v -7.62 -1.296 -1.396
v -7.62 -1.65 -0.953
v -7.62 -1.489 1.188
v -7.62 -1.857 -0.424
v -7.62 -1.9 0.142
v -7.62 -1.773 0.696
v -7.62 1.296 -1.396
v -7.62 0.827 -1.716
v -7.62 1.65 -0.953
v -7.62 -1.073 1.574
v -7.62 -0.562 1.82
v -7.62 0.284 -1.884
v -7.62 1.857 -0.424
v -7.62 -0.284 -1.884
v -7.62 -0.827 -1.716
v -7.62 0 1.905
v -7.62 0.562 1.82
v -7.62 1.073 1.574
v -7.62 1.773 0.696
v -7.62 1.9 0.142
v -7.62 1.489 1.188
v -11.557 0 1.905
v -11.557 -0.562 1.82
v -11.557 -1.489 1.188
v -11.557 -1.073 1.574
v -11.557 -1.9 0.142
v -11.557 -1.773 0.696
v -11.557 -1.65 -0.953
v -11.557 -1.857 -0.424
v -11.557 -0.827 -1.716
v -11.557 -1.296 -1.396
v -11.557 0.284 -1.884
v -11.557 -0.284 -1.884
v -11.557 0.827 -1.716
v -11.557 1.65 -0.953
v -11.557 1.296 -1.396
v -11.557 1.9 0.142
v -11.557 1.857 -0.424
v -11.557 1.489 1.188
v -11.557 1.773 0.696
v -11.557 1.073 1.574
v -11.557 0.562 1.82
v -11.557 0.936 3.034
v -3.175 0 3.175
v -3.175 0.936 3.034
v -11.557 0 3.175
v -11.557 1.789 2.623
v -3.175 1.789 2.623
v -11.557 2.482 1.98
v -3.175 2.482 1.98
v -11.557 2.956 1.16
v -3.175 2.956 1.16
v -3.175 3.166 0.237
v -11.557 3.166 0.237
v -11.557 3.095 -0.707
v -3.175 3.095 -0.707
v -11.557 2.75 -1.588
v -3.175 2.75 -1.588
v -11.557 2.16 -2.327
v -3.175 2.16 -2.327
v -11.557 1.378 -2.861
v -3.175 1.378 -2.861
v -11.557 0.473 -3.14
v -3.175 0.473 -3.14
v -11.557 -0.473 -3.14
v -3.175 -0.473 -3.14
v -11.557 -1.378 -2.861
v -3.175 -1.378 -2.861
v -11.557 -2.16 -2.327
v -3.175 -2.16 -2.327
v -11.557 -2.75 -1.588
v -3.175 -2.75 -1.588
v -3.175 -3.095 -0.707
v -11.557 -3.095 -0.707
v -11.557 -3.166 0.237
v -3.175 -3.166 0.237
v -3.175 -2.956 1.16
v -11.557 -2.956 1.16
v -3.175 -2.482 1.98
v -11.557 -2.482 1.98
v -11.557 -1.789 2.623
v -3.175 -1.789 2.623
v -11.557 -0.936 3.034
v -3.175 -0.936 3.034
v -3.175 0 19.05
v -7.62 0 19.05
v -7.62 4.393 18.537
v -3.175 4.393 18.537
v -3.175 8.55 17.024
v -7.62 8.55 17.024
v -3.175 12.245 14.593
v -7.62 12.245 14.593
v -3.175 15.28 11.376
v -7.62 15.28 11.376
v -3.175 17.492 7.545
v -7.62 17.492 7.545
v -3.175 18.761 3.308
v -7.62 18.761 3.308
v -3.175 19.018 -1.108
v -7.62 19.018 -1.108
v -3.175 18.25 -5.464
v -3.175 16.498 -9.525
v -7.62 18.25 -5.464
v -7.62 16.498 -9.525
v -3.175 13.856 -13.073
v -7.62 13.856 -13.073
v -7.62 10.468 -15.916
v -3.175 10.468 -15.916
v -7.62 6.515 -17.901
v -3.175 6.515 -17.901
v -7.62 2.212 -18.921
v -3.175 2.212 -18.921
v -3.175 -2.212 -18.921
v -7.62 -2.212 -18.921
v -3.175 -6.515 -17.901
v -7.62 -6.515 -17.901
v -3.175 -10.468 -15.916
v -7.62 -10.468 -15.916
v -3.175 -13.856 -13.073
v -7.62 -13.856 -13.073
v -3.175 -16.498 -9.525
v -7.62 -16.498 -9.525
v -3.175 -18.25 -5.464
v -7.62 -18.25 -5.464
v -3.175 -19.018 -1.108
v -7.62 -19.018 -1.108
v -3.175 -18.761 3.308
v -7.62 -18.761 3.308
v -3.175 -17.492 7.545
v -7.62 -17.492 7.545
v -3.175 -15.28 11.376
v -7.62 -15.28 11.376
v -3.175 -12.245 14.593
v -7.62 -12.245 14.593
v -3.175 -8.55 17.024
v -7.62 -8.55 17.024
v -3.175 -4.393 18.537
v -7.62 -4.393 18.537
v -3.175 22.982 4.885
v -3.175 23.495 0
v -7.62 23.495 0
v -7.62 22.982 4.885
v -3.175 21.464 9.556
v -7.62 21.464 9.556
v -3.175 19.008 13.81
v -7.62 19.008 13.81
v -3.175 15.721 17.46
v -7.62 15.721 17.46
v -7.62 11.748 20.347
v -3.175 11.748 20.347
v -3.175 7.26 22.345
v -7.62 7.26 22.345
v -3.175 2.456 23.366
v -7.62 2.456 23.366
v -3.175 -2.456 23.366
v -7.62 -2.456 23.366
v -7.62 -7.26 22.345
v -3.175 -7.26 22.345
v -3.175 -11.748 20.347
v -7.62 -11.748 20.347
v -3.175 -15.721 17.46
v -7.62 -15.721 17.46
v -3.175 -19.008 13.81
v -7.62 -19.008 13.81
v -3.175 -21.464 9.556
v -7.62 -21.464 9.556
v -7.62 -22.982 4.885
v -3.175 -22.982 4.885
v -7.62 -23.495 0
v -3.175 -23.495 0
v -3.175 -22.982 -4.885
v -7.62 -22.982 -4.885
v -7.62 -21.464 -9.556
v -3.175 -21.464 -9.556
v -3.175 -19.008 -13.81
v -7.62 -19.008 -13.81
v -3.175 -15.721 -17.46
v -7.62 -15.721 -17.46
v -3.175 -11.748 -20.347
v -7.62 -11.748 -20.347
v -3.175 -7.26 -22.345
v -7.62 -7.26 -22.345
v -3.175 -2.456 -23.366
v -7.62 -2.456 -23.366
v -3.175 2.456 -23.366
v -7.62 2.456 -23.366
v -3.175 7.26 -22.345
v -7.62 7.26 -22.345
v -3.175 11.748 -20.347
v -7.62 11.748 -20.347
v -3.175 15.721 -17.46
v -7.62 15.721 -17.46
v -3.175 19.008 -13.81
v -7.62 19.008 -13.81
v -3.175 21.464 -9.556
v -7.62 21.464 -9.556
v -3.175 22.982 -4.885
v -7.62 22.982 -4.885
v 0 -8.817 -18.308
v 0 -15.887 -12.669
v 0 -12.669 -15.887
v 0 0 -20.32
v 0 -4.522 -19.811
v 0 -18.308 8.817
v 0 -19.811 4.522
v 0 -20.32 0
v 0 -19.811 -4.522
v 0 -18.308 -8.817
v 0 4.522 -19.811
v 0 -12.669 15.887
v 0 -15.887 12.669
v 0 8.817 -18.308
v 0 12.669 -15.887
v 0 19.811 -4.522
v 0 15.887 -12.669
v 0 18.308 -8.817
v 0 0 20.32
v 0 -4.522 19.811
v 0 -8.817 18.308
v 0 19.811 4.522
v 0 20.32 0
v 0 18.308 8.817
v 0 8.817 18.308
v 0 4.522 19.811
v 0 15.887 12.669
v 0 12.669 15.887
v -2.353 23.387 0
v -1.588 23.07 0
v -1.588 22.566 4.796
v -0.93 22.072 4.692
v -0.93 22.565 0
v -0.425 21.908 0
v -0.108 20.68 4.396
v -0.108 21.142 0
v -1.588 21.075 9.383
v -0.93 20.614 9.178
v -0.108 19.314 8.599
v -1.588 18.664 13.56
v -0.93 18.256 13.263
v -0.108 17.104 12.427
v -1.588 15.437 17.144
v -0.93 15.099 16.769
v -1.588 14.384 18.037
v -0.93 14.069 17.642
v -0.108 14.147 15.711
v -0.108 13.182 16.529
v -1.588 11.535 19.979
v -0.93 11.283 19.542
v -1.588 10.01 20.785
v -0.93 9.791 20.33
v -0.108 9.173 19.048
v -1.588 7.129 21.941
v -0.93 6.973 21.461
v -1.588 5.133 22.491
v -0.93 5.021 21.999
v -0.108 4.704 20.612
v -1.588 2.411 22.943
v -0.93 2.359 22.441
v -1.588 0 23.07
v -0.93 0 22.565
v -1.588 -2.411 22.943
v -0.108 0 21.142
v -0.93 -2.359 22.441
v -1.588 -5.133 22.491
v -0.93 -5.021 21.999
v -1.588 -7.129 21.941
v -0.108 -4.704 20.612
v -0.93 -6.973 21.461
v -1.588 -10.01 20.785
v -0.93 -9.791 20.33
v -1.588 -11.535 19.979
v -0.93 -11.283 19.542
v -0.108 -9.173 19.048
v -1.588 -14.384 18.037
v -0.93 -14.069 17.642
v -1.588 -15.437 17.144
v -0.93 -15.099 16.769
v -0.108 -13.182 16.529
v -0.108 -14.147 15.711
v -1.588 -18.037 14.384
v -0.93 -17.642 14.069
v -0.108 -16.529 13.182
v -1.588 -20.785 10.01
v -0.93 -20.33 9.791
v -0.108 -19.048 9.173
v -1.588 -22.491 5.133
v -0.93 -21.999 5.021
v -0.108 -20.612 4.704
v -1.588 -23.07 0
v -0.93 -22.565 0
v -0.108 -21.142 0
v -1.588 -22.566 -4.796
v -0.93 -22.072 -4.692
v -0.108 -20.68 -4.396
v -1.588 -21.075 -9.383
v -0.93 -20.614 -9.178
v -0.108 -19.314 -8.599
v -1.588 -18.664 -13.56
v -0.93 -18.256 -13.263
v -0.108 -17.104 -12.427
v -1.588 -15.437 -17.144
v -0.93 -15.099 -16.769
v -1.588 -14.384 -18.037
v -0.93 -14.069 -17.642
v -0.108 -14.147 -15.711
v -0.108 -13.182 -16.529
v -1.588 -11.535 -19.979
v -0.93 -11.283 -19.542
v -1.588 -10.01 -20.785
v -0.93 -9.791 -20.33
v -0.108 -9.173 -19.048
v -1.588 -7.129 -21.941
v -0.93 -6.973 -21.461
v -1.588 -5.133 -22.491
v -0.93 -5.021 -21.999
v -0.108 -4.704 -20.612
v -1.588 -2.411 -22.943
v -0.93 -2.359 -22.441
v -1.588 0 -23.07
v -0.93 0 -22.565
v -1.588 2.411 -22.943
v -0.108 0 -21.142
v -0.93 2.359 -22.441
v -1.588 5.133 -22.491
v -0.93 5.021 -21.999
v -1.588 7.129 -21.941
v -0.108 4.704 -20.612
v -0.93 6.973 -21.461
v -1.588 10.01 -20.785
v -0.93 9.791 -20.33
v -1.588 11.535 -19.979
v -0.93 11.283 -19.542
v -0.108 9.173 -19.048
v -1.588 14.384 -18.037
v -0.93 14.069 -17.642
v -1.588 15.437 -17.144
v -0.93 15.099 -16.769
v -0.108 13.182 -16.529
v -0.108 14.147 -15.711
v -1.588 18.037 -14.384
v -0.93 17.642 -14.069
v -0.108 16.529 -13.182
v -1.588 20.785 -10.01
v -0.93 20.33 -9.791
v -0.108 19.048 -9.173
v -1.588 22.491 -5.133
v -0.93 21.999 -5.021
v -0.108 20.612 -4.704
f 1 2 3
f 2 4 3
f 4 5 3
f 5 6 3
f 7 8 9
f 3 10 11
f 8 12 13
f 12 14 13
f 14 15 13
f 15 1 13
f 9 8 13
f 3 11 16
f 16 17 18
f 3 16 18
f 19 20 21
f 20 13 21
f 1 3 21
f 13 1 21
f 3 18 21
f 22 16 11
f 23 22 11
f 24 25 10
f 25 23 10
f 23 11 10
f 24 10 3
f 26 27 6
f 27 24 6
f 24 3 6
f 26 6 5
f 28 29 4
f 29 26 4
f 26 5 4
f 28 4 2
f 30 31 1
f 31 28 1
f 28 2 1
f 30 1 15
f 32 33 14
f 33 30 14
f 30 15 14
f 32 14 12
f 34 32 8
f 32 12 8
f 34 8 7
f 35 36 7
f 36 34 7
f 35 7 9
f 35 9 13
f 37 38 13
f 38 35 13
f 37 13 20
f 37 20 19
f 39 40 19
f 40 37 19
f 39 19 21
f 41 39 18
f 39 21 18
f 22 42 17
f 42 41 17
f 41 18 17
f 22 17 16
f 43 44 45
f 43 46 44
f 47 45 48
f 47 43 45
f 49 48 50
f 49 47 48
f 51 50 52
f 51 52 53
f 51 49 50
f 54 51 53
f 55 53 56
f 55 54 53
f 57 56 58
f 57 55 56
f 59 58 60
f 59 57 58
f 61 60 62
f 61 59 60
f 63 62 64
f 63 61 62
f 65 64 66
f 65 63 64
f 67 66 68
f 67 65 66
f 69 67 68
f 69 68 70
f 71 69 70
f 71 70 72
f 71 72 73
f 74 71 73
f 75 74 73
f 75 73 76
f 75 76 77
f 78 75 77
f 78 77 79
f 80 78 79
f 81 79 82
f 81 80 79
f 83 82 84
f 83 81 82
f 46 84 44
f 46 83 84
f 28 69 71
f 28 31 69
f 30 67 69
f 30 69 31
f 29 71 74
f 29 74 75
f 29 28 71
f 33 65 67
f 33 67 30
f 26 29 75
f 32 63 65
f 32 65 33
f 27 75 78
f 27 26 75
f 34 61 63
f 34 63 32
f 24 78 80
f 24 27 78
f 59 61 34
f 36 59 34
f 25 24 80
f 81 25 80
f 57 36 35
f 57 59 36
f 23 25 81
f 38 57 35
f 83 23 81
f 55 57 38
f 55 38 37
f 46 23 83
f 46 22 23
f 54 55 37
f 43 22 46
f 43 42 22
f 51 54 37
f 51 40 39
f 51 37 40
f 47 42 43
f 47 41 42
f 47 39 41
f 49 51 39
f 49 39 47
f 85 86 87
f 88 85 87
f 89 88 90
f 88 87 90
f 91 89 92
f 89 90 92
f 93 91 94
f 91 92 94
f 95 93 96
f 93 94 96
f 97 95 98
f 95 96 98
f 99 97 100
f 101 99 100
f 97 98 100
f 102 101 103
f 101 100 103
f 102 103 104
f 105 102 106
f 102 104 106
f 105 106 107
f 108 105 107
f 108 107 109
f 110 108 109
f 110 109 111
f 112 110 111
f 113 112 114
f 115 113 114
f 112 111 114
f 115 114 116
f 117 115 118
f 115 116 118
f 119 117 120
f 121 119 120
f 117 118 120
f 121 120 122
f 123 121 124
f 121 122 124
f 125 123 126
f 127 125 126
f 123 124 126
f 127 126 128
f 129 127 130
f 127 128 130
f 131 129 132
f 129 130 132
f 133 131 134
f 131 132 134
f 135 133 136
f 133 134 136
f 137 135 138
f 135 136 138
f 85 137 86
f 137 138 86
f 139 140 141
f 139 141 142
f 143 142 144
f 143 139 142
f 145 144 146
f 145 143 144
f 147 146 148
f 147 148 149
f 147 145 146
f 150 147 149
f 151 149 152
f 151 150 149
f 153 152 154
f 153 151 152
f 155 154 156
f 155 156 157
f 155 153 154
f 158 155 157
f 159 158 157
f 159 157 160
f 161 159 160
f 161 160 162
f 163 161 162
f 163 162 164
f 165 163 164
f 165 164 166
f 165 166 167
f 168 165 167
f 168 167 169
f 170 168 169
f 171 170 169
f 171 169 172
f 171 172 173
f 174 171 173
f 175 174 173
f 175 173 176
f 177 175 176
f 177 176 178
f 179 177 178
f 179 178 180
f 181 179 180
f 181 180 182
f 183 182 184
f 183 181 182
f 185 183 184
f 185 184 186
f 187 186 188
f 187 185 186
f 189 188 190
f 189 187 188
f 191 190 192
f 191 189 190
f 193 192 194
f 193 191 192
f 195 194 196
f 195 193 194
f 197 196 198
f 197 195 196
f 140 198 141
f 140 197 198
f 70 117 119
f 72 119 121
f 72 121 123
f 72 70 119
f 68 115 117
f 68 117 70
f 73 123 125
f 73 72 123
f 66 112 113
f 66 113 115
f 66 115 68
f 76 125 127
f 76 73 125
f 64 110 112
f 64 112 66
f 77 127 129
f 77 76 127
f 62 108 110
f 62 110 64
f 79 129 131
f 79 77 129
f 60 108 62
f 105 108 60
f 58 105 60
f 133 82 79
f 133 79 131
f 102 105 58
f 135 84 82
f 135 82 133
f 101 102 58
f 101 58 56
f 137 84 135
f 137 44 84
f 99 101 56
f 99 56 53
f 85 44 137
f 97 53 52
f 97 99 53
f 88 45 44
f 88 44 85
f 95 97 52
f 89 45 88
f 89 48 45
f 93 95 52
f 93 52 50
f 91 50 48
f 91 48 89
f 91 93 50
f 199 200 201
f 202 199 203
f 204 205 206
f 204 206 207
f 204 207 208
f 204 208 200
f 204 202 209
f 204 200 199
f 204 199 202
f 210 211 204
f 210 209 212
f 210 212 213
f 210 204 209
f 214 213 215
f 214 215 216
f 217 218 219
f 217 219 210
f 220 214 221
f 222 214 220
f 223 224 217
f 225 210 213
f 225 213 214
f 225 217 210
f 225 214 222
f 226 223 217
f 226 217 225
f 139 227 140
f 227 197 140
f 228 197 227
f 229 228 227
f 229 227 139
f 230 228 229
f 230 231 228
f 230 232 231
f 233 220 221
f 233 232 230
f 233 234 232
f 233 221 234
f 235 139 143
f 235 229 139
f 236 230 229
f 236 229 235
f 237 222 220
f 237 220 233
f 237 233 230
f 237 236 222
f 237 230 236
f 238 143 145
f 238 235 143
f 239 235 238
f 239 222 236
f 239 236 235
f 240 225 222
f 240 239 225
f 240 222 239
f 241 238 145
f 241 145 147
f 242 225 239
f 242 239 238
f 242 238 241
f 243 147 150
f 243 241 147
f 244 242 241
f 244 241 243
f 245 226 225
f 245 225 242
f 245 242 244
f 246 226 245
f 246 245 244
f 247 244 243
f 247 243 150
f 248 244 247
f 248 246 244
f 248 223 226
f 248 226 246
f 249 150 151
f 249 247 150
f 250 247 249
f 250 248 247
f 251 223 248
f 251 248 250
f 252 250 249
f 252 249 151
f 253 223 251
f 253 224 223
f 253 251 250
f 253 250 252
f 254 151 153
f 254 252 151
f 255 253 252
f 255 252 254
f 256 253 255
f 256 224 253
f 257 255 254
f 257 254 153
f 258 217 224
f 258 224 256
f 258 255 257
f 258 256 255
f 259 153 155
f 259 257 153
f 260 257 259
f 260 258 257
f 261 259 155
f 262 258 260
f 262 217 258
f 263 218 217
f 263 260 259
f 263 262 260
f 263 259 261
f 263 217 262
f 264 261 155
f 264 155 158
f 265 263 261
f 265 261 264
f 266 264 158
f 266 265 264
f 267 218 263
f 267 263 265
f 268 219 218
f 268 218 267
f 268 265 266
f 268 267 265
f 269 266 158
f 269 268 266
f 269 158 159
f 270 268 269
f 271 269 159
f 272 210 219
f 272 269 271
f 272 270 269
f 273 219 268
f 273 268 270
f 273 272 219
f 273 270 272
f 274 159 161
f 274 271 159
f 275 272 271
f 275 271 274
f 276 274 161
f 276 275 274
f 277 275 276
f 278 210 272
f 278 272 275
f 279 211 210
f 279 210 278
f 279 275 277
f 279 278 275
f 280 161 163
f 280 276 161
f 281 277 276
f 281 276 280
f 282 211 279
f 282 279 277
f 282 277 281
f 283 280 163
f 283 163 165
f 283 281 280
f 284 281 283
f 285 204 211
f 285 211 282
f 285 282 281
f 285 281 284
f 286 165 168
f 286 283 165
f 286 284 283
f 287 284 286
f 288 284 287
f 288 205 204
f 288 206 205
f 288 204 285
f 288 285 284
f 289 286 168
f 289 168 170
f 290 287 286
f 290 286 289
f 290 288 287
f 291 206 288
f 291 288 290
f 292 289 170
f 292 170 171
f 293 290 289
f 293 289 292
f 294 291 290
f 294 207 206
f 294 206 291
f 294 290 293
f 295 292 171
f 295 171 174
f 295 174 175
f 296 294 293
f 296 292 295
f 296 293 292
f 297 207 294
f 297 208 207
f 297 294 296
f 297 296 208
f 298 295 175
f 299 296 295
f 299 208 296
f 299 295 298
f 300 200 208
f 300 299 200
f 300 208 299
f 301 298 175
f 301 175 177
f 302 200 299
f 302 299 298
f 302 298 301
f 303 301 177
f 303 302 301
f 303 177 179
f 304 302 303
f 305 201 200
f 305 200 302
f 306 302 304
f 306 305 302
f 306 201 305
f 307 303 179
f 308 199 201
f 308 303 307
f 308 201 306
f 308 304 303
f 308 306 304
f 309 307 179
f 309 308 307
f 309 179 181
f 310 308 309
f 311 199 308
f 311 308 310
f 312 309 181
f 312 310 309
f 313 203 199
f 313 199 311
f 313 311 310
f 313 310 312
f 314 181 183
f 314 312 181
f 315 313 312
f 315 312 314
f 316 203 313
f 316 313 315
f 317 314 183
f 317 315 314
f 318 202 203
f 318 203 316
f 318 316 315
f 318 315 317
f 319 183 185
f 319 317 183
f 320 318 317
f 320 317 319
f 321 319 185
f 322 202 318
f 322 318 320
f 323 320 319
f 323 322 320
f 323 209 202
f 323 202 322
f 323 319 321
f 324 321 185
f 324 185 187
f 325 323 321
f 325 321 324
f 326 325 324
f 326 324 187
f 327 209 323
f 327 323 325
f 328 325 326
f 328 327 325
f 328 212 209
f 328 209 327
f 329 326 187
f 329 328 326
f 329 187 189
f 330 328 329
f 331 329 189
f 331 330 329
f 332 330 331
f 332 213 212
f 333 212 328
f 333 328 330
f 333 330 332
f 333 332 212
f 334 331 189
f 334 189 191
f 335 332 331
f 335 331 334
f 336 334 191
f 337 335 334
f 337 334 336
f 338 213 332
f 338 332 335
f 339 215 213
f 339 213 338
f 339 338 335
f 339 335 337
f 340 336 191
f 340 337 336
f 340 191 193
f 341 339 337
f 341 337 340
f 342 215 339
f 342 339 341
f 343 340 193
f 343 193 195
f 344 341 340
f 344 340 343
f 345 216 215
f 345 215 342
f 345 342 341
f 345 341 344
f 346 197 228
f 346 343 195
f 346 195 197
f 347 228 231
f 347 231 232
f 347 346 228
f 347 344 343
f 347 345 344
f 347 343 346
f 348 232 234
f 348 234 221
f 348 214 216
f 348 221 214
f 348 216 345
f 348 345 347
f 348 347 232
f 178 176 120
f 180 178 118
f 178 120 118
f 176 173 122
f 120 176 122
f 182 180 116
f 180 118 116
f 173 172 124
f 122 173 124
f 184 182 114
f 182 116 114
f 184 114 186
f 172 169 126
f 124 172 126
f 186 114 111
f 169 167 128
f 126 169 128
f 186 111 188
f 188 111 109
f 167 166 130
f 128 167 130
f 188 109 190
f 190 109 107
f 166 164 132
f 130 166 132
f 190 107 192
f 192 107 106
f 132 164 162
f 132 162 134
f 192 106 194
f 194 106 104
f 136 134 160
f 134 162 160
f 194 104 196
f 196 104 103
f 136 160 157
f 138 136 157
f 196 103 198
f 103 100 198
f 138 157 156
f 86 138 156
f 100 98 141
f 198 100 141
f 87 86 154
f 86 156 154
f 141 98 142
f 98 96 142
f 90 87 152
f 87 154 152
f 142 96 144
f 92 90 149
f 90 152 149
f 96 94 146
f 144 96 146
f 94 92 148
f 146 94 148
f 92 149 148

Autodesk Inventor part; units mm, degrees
ref_plane "YZ Plane" through (0, 0, 0) normal (1, 0, 0) x (0, 1, 0)
ref_plane "XZ Plane" through (0, 0, 0) normal (0, 1, 0) x (-1, 0, 0)
ref_plane "XY Plane" through (0, 0, 0) normal (0, 0, 1) x (1, 0, 0)
sketch "Sketch1" plane through (0, 0, 0) normal (1, 0, 0) x (0, 1, 0)
  circle A0 centre (0, 0) radius 23.495
  dimension "d0" = 46.99
extrude "Extrusion1" add sketch "Sketch1" against normal blind 7.62
fillet "Fillet1" radius 3.175 1 edges at (0, -23.495, 0)
sketch "Sketch2" plane through (-7.62, 0, 0) normal (-1, 0, 0) x (0, 0, 1)
  circle A0 centre (0, 0) radius 3.175
  circle A1 centre (0, 0) radius 1.905
  dimension "d4" = 6.35
  dimension "d5" = 3.81
extrude "Extrusion2" add sketch "Sketch2" along normal blind 3.937
sketch "Sketch3" plane through (-7.62, 0, 0) normal (-1, 0, 0) x (0, 0, 1)
  circle A0 centre (0, 0) radius 19.05
  circle A1 centre (0, 0) radius 1.905 projected
  circle A2 centre (0, 0) radius 3.175
  dimension "d8" = 38.1
  dimension "d9" = 6.35
extrude "Extrusion3" cut sketch "Sketch3" against normal blind 4.445 contours A0
properties part number "Chairs Wheel (H)"
